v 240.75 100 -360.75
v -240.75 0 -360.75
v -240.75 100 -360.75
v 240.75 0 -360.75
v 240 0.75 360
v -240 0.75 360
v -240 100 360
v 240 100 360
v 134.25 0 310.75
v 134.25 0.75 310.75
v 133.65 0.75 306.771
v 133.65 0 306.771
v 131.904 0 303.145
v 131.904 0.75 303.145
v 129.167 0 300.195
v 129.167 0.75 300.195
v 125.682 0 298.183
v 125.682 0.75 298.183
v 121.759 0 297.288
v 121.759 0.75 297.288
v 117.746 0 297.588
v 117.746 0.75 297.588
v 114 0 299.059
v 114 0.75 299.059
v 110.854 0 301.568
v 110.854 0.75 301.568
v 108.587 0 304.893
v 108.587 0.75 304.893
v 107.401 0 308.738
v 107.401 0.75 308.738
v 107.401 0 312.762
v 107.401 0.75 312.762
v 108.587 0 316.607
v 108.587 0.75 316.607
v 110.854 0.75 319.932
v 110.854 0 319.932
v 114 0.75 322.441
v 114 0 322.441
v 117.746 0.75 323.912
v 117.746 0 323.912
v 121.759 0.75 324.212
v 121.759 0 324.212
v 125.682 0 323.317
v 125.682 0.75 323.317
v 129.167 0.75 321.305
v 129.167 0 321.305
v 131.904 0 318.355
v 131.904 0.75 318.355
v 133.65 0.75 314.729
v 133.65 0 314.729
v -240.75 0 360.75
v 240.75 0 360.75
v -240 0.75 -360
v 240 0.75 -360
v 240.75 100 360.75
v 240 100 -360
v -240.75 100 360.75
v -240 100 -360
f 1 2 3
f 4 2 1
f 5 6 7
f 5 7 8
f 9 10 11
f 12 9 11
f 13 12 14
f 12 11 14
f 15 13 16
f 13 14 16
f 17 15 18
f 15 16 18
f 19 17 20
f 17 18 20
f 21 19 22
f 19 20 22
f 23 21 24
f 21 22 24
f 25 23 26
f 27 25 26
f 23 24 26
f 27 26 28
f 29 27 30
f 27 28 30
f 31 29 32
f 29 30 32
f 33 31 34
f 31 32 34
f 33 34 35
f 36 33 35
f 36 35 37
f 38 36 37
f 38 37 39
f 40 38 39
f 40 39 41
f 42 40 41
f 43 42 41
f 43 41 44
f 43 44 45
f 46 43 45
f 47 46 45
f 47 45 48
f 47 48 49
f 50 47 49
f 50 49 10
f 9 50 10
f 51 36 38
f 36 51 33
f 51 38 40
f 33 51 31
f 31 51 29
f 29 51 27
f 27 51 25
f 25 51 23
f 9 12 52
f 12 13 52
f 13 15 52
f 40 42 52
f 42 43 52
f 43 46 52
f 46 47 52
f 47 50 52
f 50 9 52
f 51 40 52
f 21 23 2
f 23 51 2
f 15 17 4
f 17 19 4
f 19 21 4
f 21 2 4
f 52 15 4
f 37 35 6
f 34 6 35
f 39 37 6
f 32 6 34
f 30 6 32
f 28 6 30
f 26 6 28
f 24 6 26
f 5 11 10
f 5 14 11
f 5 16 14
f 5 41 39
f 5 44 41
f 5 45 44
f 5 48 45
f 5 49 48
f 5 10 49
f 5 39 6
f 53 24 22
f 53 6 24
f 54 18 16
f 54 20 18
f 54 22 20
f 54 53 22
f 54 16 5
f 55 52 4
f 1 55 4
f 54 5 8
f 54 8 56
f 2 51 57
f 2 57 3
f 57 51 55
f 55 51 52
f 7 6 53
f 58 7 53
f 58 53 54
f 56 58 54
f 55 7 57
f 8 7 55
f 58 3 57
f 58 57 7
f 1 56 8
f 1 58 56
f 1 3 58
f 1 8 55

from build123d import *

# Parameters (mm, degrees)
SKETCH1_W           = 481.5
SKETCH1_H           = 721.5
BOSS_EXTRUDE1_DEPTH = 100
SHELL1_T            = -0.75
SKETCH2_R           = 13.5
CUT_EXTRUDE1_DEPTH  = 10


with BuildPart() as part:
    # Sketch1 → Boss-Extrude1 (new body)
    with BuildSketch(Plane(origin=(0, 0, 0), x_dir=(1, 0, 0), z_dir=(0, 1, 0))):
        Rectangle(SKETCH1_W, SKETCH1_H)
    extrude(amount=BOSS_EXTRUDE1_DEPTH)

    # Shell1
    shell1_openings = [part.faces().sort_by_distance(p)[0] for p in [
        (0, 100, 0),
    ]]
    offset(amount=SHELL1_T, openings=shell1_openings, kind=Kind.INTERSECTION)

    # Sketch2 → Cut-Extrude1 (cut)
    with BuildSketch(Plane(origin=(0, 0.75, 0), x_dir=(1, 0, 0), z_dir=(0, 1, 0))):
        with Locations((120.75, -310.75)):
            Circle(SKETCH2_R)
    extrude(amount=-CUT_EXTRUDE1_DEPTH, mode=Mode.SUBTRACT)


solid = part.part
